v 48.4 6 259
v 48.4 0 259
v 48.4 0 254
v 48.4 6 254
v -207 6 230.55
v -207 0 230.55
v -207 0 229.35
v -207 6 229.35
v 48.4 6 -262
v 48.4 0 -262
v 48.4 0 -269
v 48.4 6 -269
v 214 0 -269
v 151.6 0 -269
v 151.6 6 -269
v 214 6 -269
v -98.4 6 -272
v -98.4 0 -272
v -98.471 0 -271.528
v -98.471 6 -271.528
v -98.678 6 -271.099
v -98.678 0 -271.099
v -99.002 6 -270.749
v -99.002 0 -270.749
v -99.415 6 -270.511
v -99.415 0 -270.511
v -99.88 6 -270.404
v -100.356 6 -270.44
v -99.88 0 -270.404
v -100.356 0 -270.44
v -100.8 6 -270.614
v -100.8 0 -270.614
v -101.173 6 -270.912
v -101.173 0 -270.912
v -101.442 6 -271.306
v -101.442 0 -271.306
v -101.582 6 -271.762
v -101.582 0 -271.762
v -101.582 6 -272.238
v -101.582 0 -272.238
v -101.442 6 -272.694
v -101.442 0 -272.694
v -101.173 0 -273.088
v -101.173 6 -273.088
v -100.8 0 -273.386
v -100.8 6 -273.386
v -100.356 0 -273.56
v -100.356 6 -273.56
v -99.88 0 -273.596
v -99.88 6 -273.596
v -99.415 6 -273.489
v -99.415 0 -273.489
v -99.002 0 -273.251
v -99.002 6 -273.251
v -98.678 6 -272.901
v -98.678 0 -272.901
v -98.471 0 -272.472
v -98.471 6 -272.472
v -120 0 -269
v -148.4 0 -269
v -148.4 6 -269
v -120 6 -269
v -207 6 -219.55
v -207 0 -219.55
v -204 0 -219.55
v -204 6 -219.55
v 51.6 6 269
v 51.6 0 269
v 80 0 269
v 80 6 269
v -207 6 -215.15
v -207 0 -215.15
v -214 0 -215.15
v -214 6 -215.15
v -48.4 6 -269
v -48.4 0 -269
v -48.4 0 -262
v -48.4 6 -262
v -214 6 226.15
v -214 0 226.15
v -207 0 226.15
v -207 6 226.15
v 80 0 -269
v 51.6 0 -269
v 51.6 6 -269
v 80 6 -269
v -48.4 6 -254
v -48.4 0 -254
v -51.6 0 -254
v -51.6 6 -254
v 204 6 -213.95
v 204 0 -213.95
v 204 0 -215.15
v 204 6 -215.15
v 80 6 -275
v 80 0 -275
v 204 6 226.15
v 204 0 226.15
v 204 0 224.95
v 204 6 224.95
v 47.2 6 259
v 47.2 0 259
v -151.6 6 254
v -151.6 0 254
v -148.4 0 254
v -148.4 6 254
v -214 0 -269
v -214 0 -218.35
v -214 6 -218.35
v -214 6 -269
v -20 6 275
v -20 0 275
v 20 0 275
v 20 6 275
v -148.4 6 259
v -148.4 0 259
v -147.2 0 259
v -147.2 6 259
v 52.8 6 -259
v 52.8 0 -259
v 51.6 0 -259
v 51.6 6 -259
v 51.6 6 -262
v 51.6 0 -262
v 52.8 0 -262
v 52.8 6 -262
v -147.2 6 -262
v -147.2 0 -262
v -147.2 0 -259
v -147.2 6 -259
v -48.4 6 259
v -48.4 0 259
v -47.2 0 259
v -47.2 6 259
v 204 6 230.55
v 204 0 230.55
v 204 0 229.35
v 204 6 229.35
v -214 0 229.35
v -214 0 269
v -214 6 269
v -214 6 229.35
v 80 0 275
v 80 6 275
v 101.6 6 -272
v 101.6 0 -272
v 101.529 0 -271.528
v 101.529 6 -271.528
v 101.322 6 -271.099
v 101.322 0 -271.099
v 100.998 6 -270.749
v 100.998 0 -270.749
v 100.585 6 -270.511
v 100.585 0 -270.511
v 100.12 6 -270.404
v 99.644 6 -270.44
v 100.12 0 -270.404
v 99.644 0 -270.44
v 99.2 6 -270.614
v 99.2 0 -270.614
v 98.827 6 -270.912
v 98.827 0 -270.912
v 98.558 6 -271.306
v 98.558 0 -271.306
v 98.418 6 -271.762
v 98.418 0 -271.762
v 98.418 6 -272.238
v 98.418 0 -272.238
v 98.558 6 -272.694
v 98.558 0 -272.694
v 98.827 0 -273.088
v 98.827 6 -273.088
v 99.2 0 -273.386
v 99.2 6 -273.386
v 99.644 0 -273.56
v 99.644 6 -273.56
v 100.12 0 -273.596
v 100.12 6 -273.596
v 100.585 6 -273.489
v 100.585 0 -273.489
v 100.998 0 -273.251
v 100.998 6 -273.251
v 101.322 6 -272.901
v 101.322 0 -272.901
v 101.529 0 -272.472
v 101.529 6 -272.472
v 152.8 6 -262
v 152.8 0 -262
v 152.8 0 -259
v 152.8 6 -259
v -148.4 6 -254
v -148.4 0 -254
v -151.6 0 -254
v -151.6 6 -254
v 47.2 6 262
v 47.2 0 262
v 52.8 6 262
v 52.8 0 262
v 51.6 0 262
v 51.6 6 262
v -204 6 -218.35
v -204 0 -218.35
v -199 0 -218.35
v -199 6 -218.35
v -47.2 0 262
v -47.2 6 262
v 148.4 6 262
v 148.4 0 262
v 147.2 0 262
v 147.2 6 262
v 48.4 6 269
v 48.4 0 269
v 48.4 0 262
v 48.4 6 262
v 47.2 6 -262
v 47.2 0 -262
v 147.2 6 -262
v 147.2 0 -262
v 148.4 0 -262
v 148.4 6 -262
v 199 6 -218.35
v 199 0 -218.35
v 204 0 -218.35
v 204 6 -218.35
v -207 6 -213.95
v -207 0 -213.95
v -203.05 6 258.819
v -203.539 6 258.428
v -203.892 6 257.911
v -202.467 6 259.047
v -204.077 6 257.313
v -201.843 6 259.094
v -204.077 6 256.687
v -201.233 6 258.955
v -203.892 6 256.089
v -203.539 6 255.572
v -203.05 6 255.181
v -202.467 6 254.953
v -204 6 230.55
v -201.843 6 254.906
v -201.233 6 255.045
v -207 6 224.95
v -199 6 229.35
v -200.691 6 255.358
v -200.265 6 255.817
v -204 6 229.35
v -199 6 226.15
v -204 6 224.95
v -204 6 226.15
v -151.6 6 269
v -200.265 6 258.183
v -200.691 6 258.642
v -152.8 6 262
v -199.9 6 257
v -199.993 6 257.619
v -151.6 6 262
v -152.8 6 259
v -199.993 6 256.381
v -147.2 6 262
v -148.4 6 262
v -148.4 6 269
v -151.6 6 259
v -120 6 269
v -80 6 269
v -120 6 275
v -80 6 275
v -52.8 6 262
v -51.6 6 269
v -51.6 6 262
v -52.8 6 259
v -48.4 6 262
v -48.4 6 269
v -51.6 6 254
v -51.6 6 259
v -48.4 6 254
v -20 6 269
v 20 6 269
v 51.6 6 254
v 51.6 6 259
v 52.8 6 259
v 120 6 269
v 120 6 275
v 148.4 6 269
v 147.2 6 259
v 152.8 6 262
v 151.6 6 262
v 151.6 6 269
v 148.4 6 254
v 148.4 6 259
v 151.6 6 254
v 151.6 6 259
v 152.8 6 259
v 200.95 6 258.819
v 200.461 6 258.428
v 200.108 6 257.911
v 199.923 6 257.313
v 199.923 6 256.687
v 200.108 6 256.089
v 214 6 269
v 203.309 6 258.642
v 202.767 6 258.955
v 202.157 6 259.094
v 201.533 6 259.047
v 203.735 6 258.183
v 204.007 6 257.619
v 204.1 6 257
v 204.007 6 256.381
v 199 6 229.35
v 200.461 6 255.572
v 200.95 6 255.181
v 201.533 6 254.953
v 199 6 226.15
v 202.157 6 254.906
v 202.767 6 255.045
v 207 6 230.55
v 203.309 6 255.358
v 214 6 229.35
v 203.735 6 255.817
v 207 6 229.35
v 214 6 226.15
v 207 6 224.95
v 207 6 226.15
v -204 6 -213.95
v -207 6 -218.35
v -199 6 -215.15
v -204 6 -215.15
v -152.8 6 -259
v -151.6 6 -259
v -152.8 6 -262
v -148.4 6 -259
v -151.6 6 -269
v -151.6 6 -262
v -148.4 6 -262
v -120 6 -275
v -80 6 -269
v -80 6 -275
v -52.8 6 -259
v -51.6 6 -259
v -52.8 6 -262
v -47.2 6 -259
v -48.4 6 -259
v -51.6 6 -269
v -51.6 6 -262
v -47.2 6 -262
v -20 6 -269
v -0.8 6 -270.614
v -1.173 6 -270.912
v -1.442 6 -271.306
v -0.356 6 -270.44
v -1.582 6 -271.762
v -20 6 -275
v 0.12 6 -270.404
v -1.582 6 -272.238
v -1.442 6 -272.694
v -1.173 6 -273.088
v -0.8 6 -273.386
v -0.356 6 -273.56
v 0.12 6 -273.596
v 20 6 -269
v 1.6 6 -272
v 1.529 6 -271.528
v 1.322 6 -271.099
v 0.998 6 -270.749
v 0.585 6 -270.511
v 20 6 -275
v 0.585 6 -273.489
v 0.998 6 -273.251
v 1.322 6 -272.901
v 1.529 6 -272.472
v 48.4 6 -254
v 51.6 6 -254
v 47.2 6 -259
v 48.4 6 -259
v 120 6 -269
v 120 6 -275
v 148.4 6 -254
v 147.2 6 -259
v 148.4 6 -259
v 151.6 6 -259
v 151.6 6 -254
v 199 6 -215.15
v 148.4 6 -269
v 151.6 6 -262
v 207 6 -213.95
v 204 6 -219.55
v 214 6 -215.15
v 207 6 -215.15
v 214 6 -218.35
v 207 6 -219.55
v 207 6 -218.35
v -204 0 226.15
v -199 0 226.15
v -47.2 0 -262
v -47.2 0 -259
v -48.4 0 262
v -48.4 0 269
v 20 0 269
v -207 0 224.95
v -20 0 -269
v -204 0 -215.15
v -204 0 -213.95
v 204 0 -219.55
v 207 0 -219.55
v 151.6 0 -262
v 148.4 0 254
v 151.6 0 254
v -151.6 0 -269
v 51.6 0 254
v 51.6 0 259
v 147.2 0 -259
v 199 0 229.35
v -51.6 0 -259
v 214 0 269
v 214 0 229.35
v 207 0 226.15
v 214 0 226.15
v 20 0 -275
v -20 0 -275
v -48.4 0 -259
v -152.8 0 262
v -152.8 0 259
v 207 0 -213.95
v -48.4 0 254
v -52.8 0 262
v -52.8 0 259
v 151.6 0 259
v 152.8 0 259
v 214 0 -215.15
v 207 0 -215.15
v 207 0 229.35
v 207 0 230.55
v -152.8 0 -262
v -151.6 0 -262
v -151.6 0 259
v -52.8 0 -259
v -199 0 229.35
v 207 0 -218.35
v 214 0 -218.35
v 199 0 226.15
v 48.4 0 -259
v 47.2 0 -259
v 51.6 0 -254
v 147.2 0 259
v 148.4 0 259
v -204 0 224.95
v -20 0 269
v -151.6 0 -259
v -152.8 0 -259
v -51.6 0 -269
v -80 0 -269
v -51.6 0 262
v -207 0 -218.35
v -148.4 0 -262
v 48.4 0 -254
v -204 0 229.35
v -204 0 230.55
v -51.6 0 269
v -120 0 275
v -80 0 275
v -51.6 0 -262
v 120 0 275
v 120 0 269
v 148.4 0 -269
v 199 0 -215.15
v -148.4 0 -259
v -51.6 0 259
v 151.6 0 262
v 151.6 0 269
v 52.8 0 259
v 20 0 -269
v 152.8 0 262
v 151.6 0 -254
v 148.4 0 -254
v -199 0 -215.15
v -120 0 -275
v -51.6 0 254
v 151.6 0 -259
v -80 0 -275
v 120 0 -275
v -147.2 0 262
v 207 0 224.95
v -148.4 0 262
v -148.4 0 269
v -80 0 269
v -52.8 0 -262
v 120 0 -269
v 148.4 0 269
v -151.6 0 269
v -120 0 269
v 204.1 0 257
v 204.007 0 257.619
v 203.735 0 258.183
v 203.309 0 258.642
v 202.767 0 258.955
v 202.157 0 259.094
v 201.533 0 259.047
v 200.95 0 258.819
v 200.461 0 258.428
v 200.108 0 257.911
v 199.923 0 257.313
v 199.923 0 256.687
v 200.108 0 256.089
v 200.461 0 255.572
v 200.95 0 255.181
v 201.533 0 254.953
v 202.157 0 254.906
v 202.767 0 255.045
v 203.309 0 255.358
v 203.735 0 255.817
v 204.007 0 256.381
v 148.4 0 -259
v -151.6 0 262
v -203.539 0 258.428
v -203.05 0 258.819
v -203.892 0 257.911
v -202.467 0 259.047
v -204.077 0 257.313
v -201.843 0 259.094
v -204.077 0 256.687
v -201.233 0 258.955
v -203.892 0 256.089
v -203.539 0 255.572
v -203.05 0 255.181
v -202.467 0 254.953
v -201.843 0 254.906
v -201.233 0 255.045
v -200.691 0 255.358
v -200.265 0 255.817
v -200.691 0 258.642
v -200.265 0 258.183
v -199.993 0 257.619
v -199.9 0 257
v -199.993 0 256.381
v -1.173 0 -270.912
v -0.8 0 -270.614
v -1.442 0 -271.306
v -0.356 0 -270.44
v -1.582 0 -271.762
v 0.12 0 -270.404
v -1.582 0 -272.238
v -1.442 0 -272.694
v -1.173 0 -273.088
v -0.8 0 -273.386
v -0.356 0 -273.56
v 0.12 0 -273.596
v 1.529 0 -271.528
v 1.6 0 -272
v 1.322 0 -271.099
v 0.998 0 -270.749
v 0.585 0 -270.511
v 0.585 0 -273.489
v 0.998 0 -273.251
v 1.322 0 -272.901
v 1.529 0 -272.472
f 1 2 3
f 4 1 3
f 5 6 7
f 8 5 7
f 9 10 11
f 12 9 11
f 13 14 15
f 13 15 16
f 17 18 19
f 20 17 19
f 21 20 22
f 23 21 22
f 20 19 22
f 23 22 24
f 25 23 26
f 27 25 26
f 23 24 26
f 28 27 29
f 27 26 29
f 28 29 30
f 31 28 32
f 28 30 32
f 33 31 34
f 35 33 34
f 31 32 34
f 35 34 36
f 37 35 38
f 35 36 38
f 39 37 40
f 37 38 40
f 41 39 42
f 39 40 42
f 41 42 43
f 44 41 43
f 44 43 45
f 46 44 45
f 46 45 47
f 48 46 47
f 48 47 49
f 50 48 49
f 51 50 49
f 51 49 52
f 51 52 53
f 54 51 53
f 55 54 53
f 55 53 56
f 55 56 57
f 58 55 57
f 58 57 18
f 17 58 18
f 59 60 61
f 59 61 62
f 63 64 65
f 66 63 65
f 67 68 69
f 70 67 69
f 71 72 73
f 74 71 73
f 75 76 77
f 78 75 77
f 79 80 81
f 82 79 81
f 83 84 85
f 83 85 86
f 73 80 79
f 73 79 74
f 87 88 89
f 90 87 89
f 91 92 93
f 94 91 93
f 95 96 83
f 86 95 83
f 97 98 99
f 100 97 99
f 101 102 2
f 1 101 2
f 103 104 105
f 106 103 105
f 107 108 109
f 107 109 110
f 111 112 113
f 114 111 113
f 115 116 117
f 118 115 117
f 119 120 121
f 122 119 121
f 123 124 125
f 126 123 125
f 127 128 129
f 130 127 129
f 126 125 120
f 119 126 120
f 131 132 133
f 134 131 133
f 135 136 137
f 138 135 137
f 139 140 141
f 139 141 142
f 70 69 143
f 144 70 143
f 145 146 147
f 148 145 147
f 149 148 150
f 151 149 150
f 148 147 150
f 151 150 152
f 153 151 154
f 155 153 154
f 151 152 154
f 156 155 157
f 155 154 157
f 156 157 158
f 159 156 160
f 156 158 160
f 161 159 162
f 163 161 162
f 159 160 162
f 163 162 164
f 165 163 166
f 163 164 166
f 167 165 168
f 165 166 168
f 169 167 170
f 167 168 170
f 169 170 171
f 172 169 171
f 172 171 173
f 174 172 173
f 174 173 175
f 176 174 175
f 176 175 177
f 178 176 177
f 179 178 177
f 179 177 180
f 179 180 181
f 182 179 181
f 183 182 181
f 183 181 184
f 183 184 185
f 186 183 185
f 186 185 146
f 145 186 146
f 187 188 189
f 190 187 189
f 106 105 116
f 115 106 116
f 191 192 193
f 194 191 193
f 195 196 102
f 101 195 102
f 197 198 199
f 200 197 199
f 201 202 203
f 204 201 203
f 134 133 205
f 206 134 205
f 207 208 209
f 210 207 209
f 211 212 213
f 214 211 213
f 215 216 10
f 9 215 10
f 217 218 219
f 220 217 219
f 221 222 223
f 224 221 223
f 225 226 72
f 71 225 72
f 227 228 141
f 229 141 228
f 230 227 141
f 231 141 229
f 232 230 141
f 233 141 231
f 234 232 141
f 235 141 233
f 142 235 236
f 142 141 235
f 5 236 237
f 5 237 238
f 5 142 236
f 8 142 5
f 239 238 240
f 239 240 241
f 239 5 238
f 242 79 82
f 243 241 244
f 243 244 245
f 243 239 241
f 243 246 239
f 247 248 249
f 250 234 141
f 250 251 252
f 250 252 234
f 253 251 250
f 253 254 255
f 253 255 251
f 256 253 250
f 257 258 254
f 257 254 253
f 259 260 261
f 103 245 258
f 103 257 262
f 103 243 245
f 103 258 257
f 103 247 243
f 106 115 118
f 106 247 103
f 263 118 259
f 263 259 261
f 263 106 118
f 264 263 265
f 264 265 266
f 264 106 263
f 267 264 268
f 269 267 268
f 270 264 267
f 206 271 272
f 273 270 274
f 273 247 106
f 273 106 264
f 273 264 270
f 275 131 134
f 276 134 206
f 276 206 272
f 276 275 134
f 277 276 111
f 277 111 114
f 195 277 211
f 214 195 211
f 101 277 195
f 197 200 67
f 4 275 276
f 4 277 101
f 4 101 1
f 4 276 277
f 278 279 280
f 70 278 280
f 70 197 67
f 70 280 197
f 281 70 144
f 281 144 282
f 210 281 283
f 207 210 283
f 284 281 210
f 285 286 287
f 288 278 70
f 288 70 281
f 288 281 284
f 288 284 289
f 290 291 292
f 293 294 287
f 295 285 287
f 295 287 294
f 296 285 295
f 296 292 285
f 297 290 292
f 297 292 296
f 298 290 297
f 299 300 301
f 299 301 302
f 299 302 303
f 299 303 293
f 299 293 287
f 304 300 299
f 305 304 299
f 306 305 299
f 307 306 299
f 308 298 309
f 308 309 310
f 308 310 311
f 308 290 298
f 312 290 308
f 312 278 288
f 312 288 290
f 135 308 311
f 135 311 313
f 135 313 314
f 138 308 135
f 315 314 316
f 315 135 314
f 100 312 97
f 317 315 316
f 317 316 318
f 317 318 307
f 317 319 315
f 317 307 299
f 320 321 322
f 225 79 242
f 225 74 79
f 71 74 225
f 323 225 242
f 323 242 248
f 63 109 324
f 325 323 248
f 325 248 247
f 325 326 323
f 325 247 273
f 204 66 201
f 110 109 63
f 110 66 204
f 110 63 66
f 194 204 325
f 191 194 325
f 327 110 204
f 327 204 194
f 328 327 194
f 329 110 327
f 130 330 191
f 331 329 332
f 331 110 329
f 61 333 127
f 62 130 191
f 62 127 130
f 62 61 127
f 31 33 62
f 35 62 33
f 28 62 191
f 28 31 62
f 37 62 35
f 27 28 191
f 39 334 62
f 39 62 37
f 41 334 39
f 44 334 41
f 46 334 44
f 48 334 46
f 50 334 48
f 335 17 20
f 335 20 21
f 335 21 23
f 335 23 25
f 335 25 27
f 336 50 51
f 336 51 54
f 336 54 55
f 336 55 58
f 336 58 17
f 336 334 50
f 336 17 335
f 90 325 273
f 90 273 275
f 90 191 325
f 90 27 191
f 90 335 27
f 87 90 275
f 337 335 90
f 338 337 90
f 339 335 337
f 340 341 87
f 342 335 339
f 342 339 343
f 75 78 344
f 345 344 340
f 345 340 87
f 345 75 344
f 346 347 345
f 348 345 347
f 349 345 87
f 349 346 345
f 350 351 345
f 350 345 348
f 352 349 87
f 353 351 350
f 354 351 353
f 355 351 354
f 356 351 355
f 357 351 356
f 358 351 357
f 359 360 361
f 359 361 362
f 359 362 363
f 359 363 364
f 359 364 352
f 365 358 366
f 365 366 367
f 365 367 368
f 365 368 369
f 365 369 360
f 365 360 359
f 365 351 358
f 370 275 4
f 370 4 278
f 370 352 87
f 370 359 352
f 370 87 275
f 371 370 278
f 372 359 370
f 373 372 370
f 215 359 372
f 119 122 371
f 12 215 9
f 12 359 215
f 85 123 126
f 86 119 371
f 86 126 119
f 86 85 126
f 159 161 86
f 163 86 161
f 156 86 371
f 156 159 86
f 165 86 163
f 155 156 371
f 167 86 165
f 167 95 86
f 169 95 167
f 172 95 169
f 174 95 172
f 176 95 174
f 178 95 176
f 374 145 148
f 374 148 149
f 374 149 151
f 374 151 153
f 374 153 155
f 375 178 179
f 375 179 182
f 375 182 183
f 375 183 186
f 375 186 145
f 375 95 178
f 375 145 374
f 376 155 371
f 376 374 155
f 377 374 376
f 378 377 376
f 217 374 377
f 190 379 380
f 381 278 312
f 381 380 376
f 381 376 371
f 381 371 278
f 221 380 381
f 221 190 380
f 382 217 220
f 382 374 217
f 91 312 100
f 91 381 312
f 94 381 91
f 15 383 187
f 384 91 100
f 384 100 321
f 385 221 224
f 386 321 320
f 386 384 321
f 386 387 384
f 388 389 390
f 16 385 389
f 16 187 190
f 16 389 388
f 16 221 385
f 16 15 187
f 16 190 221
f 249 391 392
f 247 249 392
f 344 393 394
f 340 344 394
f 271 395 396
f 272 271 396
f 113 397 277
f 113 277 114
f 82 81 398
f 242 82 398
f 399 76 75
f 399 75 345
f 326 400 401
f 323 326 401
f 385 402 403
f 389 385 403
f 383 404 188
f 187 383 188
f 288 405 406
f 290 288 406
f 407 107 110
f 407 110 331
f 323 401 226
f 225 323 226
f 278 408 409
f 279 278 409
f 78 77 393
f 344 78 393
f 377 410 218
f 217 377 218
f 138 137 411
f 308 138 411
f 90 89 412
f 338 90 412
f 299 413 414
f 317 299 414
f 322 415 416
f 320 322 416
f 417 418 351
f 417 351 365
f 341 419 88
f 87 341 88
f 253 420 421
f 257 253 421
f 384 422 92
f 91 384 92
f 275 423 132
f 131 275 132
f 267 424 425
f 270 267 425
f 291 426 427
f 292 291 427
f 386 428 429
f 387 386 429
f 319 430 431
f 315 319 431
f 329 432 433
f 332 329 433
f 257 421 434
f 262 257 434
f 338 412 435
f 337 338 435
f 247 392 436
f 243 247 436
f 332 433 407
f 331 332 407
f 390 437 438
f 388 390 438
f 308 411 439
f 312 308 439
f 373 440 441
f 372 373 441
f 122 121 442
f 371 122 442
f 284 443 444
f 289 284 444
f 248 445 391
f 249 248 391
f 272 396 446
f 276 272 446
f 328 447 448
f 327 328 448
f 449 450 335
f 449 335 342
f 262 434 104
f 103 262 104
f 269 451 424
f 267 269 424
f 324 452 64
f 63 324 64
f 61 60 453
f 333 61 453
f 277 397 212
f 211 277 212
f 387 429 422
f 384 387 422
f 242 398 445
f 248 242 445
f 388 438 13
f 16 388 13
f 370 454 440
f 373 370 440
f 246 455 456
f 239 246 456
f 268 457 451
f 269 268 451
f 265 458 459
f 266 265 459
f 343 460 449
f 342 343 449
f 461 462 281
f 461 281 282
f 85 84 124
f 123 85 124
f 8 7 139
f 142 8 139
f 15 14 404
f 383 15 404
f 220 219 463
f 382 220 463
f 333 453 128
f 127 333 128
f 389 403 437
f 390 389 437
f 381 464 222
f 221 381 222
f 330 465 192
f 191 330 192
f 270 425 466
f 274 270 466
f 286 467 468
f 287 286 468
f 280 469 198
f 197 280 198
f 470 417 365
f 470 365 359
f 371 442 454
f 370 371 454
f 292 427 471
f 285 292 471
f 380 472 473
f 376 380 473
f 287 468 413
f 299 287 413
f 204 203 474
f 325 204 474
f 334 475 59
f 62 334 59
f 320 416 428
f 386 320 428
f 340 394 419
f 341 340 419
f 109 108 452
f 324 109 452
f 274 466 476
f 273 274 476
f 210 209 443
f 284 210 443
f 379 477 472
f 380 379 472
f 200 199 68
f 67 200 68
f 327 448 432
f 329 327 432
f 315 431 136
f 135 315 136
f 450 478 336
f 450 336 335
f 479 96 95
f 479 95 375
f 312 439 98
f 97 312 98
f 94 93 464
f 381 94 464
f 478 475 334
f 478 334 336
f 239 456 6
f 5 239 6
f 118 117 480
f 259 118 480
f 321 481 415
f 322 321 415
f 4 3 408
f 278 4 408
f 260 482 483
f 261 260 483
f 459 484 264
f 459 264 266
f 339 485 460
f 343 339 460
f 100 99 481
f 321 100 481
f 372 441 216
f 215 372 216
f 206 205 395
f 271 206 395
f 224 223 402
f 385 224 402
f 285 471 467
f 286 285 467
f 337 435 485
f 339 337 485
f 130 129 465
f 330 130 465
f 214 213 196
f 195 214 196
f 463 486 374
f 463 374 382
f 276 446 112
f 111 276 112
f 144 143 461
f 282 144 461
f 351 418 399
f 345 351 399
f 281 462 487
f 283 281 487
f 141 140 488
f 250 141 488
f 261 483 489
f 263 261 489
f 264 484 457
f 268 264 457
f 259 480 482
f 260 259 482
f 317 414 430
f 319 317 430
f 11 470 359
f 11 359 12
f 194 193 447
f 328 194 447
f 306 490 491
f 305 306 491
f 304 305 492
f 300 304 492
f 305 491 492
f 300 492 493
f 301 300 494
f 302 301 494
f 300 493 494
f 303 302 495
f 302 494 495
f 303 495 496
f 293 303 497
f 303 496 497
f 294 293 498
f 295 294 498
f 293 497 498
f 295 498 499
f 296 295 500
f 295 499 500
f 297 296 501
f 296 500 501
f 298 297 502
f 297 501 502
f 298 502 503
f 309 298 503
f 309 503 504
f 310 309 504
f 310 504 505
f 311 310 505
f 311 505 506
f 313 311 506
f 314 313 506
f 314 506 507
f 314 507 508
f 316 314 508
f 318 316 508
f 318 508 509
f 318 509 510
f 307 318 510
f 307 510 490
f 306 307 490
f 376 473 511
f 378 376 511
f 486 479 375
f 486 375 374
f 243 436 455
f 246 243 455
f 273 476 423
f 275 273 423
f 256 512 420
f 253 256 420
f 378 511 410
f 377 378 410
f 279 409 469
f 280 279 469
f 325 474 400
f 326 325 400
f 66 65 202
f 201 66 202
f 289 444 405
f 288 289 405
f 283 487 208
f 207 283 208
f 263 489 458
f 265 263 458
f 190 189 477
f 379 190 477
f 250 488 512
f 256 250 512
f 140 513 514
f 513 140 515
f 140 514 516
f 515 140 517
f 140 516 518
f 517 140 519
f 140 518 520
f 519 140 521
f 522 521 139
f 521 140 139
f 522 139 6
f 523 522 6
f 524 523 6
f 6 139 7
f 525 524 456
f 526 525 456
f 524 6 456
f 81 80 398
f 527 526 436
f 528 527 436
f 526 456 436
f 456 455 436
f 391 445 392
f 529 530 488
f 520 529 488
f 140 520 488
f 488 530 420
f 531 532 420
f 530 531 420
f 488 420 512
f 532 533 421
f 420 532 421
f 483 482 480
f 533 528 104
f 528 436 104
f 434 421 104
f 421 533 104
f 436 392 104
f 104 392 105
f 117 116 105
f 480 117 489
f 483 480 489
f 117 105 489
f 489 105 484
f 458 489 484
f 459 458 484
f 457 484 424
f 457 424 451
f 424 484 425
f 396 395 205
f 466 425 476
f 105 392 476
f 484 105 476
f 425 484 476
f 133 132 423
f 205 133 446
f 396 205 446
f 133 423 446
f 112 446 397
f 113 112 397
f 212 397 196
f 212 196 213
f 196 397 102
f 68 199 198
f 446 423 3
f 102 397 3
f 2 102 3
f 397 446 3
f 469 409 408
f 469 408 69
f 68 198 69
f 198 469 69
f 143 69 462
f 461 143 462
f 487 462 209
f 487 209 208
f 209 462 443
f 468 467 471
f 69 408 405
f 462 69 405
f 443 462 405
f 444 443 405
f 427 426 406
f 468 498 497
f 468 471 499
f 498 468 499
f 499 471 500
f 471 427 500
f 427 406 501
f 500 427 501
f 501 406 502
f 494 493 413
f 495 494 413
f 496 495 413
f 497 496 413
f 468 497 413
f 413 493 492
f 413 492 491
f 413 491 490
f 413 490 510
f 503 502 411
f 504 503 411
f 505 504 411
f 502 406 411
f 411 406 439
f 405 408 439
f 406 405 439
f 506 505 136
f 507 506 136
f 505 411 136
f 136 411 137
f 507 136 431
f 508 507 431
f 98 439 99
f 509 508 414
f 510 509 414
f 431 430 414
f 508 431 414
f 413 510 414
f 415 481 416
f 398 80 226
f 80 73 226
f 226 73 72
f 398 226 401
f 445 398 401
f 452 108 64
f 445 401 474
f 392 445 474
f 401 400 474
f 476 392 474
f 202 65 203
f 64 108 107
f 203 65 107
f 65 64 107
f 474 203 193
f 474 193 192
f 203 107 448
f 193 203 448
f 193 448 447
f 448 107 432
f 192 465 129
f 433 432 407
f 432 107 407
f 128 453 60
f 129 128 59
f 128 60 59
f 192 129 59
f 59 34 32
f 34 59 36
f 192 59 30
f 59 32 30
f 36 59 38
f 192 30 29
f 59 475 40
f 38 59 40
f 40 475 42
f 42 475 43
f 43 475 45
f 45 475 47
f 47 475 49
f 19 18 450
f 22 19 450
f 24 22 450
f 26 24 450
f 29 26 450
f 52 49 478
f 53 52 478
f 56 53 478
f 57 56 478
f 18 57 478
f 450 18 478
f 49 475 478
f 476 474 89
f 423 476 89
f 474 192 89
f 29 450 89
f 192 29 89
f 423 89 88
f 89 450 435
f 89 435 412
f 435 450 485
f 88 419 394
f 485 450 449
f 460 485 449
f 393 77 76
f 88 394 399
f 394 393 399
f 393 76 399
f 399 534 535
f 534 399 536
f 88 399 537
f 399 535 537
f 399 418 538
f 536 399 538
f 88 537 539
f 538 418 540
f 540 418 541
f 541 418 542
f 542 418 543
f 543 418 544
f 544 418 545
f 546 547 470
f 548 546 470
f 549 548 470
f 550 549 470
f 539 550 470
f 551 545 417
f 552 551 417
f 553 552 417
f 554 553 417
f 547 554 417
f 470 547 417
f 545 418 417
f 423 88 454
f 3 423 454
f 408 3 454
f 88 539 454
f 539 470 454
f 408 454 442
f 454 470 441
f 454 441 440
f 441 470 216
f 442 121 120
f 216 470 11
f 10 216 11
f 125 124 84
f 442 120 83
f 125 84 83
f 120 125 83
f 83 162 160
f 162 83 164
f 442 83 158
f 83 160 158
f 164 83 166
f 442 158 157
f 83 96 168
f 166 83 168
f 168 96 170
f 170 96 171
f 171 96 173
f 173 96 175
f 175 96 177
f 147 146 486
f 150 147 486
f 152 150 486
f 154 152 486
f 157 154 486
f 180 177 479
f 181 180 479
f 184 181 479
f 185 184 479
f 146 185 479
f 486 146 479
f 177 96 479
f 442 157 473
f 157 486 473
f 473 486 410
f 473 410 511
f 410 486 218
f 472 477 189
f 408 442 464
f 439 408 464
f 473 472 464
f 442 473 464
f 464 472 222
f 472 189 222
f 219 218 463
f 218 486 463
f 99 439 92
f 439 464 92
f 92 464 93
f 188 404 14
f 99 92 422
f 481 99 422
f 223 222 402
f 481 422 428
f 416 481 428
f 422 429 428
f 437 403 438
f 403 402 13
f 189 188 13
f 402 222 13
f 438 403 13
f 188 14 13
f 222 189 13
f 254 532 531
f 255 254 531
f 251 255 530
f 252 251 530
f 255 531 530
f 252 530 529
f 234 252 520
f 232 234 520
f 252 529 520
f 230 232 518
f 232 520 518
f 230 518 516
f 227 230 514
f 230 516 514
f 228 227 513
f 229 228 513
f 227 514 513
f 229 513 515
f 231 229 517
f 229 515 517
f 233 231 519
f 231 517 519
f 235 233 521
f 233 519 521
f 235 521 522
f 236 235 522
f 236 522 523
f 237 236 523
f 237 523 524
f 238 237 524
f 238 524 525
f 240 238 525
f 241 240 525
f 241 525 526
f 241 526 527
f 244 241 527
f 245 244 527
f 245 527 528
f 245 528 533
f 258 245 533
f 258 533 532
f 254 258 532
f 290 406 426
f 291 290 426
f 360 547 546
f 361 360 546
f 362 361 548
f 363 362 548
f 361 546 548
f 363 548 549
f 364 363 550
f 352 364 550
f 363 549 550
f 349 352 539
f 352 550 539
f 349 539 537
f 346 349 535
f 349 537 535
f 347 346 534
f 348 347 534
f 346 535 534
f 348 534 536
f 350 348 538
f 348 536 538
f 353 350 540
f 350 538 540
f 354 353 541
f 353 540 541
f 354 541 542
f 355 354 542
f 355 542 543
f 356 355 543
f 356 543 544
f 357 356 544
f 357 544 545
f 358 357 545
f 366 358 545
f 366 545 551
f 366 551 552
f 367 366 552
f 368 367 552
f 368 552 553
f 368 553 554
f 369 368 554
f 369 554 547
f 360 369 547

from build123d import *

# Parameters (mm, degrees)
SKETCH1_W           = 428
SKETCH1_H           = 538
BOSS_EXTRUDE1_DEPTH = 6
SKETCH2_W           = 40
SKETCH2_H           = 6
BOSS_EXTRUDE2_DEPTH = 6
SKETCH3_R           = 1.6
SKETCH3_R_2         = 2.1
CUT_EXTRUDE1_DEPTH  = 7


with BuildPart() as part:
    # Sketch1 → Boss-Extrude1 (new body)
    with BuildSketch(Plane(origin=(0, 0, 0), x_dir=(1, 0, 0), z_dir=(0, 1, 0))):
        Rectangle(SKETCH1_W, SKETCH1_H)
    extrude(amount=BOSS_EXTRUDE1_DEPTH)

    # Sketch2 → Boss-Extrude2 (add)
    with BuildSketch(Plane.XZ):
        with Locations((-100, 272)):
            Rectangle(SKETCH2_W, SKETCH2_H)
        with Locations((0, 272)):
            Rectangle(SKETCH2_W, SKETCH2_H)
        with Locations((100, 272)):
            Rectangle(SKETCH2_W, SKETCH2_H)
        with Locations((100, -272)):
            Rectangle(SKETCH2_W, SKETCH2_H)
        with Locations((0, -272)):
            Rectangle(SKETCH2_W, SKETCH2_H)
        with Locations((-100, -272)):
            Rectangle(SKETCH2_W, SKETCH2_H)
    extrude(amount=-BOSS_EXTRUDE2_DEPTH)

    # Sketch3 → Cut-Extrude1 (cut, through all)
    with BuildSketch(Plane.XZ):
        Polygon((204, -219.55), (207, -219.55), (207, -218.35), (214, -218.35), (214, -215.15), (207, -215.15), (207, -213.95), (204, -213.95), (204, -215.15), (199, -215.15), (199, -218.35), (204, -218.35), align=None)
        Polygon((-214, 229.35), (-214, 226.15), (-207, 226.15), (-207, 224.95), (-204, 224.95), (-204, 226.15), (-199, 226.15), (-199, 229.35), (-204, 229.35), (-204, 230.55), (-207, 230.55), (-207, 229.35), align=None)
        Polygon((-214, -215.15), (-214, -218.35), (-207, -218.35), (-207, -219.55), (-204, -219.55), (-204, -218.35), (-199, -218.35), (-199, -215.15), (-204, -215.15), (-204, -213.95), (-207, -213.95), (-207, -215.15), align=None)
        Polygon((207, 226.15), (214, 226.15), (214, 229.35), (207, 229.35), (207, 230.55), (204, 230.55), (204, 229.35), (199, 229.35), (199, 226.15), (204, 226.15), (204, 224.95), (207, 224.95), align=None)
        Polygon((151.6, 254), (151.6, 259), (152.8, 259), (152.8, 262), (151.6, 262), (151.6, 269), (148.4, 269), (148.4, 262), (147.2, 262), (147.2, 259), (148.4, 259), (148.4, 254), align=None)
        Polygon((51.6, 254), (51.6, 259), (52.8, 259), (52.8, 262), (51.6, 262), (51.6, 269), (48.4, 269), (48.4, 262), (47.2, 262), (47.2, 259), (48.4, 259), (48.4, 254), align=None)
        Polygon((-48.4, 254), (-48.4, 259), (-47.2, 259), (-47.2, 262), (-48.4, 262), (-48.4, 269), (-51.6, 269), (-51.6, 262), (-52.8, 262), (-52.8, 259), (-51.6, 259), (-51.6, 254), align=None)
        Polygon((-148.4, 254), (-148.4, 259), (-147.2, 259), (-147.2, 262), (-148.4, 262), (-148.4, 269), (-151.6, 269), (-151.6, 262), (-152.8, 262), (-152.8, 259), (-151.6, 259), (-151.6, 254), align=None)
        Polygon((-148.4, -254), (-151.6, -254), (-151.6, -259), (-152.8, -259), (-152.8, -262), (-151.6, -262), (-151.6, -269), (-148.4, -269), (-148.4, -262), (-147.2, -262), (-147.2, -259), (-148.4, -259), align=None)
        Polygon((-48.4, -254), (-51.6, -254), (-51.6, -259), (-52.8, -259), (-52.8, -262), (-51.6, -262), (-51.6, -269), (-48.4, -269), (-48.4, -262), (-47.2, -262), (-47.2, -259), (-48.4, -259), align=None)
        Polygon((51.6, -254), (48.4, -254), (48.4, -259), (47.2, -259), (47.2, -262), (48.4, -262), (48.4, -269), (51.6, -269), (51.6, -262), (52.8, -262), (52.8, -259), (51.6, -259), align=None)
        Polygon((151.6, -254), (148.4, -254), (148.4, -259), (147.2, -259), (147.2, -262), (148.4, -262), (148.4, -269), (151.6, -269), (151.6, -262), (152.8, -262), (152.8, -259), (151.6, -259), align=None)
        with Locations((-100, -272)):
            Circle(SKETCH3_R)
        with Locations((0, -272)):
            Circle(SKETCH3_R)
        with Locations((100, -272)):
            Circle(SKETCH3_R)
        with Locations((202, 257)):
            Circle(SKETCH3_R_2)
        with Locations((-202, 257)):
            Circle(SKETCH3_R_2)
    extrude(amount=-CUT_EXTRUDE1_DEPTH, mode=Mode.SUBTRACT)


solid = part.part
